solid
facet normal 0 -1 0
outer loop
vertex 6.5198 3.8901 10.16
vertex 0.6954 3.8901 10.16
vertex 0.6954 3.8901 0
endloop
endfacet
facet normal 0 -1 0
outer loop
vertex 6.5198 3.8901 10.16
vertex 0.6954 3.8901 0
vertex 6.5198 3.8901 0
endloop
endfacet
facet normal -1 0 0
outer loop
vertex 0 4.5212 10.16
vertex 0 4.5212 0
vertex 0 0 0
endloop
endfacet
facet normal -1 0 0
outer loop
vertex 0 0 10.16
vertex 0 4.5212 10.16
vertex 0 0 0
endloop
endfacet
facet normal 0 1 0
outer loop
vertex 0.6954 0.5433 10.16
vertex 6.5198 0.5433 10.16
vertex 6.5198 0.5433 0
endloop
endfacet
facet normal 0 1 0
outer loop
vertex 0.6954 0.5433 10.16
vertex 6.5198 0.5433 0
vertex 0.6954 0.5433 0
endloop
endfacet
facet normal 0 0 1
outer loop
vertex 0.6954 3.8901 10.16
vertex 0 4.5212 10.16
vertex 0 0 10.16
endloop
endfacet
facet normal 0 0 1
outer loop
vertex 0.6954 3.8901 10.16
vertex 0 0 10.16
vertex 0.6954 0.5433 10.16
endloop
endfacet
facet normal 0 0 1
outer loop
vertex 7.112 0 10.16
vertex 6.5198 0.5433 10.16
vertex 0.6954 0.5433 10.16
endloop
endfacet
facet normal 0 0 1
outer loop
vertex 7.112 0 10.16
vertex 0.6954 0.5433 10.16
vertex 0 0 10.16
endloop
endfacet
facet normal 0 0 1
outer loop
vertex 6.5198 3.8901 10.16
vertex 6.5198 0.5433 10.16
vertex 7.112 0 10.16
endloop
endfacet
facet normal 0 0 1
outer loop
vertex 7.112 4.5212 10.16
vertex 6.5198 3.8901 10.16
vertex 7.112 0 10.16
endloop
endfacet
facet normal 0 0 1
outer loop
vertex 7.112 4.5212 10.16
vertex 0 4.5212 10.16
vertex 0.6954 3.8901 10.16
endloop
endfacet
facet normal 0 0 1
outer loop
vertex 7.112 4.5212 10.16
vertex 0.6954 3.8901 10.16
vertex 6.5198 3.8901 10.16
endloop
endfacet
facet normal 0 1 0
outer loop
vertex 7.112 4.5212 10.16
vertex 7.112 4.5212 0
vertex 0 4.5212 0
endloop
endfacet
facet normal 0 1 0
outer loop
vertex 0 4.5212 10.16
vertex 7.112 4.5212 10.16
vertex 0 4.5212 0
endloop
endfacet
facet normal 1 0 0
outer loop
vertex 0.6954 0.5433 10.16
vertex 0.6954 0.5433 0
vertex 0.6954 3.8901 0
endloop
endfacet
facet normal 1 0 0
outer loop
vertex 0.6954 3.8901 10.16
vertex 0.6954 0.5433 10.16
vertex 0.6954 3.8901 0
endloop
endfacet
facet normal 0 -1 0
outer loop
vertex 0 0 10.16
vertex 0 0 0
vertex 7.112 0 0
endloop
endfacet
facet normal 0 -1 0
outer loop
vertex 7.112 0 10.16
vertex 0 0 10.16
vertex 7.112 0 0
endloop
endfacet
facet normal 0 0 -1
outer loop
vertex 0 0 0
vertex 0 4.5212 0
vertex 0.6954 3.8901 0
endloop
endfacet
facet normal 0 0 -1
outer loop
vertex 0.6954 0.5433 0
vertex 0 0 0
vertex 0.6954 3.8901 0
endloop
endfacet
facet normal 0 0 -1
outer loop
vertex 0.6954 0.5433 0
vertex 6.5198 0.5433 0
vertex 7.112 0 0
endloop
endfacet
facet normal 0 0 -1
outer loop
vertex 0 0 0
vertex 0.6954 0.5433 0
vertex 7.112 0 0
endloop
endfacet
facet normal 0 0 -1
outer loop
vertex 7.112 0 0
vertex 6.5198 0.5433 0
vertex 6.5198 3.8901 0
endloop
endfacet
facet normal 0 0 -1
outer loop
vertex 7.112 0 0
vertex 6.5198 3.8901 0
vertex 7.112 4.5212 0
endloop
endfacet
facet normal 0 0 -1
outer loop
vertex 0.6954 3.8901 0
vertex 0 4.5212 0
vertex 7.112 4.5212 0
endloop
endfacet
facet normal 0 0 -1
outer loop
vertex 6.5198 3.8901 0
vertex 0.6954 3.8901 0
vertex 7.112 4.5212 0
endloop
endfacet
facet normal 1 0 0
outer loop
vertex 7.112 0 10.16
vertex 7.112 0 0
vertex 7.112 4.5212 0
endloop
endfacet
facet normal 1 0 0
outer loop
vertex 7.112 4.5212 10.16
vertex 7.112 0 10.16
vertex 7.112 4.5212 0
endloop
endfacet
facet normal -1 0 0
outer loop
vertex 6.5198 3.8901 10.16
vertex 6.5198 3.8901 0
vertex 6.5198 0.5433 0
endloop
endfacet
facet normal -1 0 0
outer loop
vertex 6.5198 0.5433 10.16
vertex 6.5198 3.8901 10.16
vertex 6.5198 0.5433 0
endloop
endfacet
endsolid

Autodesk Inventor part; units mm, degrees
ref_plane "YZ Plane" through (0, 0, 0) normal (1, 0, 0) x (0, 1, 0)
ref_plane "XZ Plane" through (0, 0, 0) normal (0, 1, 0) x (-1, 0, 0)
ref_plane "XY Plane" through (0, 0, 0) normal (0, 0, 1) x (1, 0, 0)
sketch "Sketch1" plane through (0, 0, 0) normal (0, 0, 1) x (1, 0, 0)
  line L0 (0, 0) -> (7.112, 0)
  line L1 (7.112, 0) -> (7.112, 4.5212)
  line L2 (7.112, 4.5212) -> (0, 4.5212)
  line L3 (0, 4.5212) -> (0, 0)
  dimension "d0" = 7.112
  dimension "d1" = 4.5212
extrude "Extrusion1" add sketch "Sketch1" along normal blind 10.16
sketch "Sketch2" plane through (0, 0, 10.16) normal (0, 0, 1) x (1, 0, 0)
  line L0 (0.6954, 3.8901) -> (6.5198, 3.8901)
  line L1 (6.5198, 3.8901) -> (6.5198, 0.5433)
  line L2 (6.5198, 0.5433) -> (0.6954, 0.5433)
  line L3 (0.6954, 0.5433) -> (0.6954, 3.8901)
  point P0 (0, 0)
extrude "Extrusion2" cut sketch "Sketch2" against normal blind 10.16
properties part number "connection"
